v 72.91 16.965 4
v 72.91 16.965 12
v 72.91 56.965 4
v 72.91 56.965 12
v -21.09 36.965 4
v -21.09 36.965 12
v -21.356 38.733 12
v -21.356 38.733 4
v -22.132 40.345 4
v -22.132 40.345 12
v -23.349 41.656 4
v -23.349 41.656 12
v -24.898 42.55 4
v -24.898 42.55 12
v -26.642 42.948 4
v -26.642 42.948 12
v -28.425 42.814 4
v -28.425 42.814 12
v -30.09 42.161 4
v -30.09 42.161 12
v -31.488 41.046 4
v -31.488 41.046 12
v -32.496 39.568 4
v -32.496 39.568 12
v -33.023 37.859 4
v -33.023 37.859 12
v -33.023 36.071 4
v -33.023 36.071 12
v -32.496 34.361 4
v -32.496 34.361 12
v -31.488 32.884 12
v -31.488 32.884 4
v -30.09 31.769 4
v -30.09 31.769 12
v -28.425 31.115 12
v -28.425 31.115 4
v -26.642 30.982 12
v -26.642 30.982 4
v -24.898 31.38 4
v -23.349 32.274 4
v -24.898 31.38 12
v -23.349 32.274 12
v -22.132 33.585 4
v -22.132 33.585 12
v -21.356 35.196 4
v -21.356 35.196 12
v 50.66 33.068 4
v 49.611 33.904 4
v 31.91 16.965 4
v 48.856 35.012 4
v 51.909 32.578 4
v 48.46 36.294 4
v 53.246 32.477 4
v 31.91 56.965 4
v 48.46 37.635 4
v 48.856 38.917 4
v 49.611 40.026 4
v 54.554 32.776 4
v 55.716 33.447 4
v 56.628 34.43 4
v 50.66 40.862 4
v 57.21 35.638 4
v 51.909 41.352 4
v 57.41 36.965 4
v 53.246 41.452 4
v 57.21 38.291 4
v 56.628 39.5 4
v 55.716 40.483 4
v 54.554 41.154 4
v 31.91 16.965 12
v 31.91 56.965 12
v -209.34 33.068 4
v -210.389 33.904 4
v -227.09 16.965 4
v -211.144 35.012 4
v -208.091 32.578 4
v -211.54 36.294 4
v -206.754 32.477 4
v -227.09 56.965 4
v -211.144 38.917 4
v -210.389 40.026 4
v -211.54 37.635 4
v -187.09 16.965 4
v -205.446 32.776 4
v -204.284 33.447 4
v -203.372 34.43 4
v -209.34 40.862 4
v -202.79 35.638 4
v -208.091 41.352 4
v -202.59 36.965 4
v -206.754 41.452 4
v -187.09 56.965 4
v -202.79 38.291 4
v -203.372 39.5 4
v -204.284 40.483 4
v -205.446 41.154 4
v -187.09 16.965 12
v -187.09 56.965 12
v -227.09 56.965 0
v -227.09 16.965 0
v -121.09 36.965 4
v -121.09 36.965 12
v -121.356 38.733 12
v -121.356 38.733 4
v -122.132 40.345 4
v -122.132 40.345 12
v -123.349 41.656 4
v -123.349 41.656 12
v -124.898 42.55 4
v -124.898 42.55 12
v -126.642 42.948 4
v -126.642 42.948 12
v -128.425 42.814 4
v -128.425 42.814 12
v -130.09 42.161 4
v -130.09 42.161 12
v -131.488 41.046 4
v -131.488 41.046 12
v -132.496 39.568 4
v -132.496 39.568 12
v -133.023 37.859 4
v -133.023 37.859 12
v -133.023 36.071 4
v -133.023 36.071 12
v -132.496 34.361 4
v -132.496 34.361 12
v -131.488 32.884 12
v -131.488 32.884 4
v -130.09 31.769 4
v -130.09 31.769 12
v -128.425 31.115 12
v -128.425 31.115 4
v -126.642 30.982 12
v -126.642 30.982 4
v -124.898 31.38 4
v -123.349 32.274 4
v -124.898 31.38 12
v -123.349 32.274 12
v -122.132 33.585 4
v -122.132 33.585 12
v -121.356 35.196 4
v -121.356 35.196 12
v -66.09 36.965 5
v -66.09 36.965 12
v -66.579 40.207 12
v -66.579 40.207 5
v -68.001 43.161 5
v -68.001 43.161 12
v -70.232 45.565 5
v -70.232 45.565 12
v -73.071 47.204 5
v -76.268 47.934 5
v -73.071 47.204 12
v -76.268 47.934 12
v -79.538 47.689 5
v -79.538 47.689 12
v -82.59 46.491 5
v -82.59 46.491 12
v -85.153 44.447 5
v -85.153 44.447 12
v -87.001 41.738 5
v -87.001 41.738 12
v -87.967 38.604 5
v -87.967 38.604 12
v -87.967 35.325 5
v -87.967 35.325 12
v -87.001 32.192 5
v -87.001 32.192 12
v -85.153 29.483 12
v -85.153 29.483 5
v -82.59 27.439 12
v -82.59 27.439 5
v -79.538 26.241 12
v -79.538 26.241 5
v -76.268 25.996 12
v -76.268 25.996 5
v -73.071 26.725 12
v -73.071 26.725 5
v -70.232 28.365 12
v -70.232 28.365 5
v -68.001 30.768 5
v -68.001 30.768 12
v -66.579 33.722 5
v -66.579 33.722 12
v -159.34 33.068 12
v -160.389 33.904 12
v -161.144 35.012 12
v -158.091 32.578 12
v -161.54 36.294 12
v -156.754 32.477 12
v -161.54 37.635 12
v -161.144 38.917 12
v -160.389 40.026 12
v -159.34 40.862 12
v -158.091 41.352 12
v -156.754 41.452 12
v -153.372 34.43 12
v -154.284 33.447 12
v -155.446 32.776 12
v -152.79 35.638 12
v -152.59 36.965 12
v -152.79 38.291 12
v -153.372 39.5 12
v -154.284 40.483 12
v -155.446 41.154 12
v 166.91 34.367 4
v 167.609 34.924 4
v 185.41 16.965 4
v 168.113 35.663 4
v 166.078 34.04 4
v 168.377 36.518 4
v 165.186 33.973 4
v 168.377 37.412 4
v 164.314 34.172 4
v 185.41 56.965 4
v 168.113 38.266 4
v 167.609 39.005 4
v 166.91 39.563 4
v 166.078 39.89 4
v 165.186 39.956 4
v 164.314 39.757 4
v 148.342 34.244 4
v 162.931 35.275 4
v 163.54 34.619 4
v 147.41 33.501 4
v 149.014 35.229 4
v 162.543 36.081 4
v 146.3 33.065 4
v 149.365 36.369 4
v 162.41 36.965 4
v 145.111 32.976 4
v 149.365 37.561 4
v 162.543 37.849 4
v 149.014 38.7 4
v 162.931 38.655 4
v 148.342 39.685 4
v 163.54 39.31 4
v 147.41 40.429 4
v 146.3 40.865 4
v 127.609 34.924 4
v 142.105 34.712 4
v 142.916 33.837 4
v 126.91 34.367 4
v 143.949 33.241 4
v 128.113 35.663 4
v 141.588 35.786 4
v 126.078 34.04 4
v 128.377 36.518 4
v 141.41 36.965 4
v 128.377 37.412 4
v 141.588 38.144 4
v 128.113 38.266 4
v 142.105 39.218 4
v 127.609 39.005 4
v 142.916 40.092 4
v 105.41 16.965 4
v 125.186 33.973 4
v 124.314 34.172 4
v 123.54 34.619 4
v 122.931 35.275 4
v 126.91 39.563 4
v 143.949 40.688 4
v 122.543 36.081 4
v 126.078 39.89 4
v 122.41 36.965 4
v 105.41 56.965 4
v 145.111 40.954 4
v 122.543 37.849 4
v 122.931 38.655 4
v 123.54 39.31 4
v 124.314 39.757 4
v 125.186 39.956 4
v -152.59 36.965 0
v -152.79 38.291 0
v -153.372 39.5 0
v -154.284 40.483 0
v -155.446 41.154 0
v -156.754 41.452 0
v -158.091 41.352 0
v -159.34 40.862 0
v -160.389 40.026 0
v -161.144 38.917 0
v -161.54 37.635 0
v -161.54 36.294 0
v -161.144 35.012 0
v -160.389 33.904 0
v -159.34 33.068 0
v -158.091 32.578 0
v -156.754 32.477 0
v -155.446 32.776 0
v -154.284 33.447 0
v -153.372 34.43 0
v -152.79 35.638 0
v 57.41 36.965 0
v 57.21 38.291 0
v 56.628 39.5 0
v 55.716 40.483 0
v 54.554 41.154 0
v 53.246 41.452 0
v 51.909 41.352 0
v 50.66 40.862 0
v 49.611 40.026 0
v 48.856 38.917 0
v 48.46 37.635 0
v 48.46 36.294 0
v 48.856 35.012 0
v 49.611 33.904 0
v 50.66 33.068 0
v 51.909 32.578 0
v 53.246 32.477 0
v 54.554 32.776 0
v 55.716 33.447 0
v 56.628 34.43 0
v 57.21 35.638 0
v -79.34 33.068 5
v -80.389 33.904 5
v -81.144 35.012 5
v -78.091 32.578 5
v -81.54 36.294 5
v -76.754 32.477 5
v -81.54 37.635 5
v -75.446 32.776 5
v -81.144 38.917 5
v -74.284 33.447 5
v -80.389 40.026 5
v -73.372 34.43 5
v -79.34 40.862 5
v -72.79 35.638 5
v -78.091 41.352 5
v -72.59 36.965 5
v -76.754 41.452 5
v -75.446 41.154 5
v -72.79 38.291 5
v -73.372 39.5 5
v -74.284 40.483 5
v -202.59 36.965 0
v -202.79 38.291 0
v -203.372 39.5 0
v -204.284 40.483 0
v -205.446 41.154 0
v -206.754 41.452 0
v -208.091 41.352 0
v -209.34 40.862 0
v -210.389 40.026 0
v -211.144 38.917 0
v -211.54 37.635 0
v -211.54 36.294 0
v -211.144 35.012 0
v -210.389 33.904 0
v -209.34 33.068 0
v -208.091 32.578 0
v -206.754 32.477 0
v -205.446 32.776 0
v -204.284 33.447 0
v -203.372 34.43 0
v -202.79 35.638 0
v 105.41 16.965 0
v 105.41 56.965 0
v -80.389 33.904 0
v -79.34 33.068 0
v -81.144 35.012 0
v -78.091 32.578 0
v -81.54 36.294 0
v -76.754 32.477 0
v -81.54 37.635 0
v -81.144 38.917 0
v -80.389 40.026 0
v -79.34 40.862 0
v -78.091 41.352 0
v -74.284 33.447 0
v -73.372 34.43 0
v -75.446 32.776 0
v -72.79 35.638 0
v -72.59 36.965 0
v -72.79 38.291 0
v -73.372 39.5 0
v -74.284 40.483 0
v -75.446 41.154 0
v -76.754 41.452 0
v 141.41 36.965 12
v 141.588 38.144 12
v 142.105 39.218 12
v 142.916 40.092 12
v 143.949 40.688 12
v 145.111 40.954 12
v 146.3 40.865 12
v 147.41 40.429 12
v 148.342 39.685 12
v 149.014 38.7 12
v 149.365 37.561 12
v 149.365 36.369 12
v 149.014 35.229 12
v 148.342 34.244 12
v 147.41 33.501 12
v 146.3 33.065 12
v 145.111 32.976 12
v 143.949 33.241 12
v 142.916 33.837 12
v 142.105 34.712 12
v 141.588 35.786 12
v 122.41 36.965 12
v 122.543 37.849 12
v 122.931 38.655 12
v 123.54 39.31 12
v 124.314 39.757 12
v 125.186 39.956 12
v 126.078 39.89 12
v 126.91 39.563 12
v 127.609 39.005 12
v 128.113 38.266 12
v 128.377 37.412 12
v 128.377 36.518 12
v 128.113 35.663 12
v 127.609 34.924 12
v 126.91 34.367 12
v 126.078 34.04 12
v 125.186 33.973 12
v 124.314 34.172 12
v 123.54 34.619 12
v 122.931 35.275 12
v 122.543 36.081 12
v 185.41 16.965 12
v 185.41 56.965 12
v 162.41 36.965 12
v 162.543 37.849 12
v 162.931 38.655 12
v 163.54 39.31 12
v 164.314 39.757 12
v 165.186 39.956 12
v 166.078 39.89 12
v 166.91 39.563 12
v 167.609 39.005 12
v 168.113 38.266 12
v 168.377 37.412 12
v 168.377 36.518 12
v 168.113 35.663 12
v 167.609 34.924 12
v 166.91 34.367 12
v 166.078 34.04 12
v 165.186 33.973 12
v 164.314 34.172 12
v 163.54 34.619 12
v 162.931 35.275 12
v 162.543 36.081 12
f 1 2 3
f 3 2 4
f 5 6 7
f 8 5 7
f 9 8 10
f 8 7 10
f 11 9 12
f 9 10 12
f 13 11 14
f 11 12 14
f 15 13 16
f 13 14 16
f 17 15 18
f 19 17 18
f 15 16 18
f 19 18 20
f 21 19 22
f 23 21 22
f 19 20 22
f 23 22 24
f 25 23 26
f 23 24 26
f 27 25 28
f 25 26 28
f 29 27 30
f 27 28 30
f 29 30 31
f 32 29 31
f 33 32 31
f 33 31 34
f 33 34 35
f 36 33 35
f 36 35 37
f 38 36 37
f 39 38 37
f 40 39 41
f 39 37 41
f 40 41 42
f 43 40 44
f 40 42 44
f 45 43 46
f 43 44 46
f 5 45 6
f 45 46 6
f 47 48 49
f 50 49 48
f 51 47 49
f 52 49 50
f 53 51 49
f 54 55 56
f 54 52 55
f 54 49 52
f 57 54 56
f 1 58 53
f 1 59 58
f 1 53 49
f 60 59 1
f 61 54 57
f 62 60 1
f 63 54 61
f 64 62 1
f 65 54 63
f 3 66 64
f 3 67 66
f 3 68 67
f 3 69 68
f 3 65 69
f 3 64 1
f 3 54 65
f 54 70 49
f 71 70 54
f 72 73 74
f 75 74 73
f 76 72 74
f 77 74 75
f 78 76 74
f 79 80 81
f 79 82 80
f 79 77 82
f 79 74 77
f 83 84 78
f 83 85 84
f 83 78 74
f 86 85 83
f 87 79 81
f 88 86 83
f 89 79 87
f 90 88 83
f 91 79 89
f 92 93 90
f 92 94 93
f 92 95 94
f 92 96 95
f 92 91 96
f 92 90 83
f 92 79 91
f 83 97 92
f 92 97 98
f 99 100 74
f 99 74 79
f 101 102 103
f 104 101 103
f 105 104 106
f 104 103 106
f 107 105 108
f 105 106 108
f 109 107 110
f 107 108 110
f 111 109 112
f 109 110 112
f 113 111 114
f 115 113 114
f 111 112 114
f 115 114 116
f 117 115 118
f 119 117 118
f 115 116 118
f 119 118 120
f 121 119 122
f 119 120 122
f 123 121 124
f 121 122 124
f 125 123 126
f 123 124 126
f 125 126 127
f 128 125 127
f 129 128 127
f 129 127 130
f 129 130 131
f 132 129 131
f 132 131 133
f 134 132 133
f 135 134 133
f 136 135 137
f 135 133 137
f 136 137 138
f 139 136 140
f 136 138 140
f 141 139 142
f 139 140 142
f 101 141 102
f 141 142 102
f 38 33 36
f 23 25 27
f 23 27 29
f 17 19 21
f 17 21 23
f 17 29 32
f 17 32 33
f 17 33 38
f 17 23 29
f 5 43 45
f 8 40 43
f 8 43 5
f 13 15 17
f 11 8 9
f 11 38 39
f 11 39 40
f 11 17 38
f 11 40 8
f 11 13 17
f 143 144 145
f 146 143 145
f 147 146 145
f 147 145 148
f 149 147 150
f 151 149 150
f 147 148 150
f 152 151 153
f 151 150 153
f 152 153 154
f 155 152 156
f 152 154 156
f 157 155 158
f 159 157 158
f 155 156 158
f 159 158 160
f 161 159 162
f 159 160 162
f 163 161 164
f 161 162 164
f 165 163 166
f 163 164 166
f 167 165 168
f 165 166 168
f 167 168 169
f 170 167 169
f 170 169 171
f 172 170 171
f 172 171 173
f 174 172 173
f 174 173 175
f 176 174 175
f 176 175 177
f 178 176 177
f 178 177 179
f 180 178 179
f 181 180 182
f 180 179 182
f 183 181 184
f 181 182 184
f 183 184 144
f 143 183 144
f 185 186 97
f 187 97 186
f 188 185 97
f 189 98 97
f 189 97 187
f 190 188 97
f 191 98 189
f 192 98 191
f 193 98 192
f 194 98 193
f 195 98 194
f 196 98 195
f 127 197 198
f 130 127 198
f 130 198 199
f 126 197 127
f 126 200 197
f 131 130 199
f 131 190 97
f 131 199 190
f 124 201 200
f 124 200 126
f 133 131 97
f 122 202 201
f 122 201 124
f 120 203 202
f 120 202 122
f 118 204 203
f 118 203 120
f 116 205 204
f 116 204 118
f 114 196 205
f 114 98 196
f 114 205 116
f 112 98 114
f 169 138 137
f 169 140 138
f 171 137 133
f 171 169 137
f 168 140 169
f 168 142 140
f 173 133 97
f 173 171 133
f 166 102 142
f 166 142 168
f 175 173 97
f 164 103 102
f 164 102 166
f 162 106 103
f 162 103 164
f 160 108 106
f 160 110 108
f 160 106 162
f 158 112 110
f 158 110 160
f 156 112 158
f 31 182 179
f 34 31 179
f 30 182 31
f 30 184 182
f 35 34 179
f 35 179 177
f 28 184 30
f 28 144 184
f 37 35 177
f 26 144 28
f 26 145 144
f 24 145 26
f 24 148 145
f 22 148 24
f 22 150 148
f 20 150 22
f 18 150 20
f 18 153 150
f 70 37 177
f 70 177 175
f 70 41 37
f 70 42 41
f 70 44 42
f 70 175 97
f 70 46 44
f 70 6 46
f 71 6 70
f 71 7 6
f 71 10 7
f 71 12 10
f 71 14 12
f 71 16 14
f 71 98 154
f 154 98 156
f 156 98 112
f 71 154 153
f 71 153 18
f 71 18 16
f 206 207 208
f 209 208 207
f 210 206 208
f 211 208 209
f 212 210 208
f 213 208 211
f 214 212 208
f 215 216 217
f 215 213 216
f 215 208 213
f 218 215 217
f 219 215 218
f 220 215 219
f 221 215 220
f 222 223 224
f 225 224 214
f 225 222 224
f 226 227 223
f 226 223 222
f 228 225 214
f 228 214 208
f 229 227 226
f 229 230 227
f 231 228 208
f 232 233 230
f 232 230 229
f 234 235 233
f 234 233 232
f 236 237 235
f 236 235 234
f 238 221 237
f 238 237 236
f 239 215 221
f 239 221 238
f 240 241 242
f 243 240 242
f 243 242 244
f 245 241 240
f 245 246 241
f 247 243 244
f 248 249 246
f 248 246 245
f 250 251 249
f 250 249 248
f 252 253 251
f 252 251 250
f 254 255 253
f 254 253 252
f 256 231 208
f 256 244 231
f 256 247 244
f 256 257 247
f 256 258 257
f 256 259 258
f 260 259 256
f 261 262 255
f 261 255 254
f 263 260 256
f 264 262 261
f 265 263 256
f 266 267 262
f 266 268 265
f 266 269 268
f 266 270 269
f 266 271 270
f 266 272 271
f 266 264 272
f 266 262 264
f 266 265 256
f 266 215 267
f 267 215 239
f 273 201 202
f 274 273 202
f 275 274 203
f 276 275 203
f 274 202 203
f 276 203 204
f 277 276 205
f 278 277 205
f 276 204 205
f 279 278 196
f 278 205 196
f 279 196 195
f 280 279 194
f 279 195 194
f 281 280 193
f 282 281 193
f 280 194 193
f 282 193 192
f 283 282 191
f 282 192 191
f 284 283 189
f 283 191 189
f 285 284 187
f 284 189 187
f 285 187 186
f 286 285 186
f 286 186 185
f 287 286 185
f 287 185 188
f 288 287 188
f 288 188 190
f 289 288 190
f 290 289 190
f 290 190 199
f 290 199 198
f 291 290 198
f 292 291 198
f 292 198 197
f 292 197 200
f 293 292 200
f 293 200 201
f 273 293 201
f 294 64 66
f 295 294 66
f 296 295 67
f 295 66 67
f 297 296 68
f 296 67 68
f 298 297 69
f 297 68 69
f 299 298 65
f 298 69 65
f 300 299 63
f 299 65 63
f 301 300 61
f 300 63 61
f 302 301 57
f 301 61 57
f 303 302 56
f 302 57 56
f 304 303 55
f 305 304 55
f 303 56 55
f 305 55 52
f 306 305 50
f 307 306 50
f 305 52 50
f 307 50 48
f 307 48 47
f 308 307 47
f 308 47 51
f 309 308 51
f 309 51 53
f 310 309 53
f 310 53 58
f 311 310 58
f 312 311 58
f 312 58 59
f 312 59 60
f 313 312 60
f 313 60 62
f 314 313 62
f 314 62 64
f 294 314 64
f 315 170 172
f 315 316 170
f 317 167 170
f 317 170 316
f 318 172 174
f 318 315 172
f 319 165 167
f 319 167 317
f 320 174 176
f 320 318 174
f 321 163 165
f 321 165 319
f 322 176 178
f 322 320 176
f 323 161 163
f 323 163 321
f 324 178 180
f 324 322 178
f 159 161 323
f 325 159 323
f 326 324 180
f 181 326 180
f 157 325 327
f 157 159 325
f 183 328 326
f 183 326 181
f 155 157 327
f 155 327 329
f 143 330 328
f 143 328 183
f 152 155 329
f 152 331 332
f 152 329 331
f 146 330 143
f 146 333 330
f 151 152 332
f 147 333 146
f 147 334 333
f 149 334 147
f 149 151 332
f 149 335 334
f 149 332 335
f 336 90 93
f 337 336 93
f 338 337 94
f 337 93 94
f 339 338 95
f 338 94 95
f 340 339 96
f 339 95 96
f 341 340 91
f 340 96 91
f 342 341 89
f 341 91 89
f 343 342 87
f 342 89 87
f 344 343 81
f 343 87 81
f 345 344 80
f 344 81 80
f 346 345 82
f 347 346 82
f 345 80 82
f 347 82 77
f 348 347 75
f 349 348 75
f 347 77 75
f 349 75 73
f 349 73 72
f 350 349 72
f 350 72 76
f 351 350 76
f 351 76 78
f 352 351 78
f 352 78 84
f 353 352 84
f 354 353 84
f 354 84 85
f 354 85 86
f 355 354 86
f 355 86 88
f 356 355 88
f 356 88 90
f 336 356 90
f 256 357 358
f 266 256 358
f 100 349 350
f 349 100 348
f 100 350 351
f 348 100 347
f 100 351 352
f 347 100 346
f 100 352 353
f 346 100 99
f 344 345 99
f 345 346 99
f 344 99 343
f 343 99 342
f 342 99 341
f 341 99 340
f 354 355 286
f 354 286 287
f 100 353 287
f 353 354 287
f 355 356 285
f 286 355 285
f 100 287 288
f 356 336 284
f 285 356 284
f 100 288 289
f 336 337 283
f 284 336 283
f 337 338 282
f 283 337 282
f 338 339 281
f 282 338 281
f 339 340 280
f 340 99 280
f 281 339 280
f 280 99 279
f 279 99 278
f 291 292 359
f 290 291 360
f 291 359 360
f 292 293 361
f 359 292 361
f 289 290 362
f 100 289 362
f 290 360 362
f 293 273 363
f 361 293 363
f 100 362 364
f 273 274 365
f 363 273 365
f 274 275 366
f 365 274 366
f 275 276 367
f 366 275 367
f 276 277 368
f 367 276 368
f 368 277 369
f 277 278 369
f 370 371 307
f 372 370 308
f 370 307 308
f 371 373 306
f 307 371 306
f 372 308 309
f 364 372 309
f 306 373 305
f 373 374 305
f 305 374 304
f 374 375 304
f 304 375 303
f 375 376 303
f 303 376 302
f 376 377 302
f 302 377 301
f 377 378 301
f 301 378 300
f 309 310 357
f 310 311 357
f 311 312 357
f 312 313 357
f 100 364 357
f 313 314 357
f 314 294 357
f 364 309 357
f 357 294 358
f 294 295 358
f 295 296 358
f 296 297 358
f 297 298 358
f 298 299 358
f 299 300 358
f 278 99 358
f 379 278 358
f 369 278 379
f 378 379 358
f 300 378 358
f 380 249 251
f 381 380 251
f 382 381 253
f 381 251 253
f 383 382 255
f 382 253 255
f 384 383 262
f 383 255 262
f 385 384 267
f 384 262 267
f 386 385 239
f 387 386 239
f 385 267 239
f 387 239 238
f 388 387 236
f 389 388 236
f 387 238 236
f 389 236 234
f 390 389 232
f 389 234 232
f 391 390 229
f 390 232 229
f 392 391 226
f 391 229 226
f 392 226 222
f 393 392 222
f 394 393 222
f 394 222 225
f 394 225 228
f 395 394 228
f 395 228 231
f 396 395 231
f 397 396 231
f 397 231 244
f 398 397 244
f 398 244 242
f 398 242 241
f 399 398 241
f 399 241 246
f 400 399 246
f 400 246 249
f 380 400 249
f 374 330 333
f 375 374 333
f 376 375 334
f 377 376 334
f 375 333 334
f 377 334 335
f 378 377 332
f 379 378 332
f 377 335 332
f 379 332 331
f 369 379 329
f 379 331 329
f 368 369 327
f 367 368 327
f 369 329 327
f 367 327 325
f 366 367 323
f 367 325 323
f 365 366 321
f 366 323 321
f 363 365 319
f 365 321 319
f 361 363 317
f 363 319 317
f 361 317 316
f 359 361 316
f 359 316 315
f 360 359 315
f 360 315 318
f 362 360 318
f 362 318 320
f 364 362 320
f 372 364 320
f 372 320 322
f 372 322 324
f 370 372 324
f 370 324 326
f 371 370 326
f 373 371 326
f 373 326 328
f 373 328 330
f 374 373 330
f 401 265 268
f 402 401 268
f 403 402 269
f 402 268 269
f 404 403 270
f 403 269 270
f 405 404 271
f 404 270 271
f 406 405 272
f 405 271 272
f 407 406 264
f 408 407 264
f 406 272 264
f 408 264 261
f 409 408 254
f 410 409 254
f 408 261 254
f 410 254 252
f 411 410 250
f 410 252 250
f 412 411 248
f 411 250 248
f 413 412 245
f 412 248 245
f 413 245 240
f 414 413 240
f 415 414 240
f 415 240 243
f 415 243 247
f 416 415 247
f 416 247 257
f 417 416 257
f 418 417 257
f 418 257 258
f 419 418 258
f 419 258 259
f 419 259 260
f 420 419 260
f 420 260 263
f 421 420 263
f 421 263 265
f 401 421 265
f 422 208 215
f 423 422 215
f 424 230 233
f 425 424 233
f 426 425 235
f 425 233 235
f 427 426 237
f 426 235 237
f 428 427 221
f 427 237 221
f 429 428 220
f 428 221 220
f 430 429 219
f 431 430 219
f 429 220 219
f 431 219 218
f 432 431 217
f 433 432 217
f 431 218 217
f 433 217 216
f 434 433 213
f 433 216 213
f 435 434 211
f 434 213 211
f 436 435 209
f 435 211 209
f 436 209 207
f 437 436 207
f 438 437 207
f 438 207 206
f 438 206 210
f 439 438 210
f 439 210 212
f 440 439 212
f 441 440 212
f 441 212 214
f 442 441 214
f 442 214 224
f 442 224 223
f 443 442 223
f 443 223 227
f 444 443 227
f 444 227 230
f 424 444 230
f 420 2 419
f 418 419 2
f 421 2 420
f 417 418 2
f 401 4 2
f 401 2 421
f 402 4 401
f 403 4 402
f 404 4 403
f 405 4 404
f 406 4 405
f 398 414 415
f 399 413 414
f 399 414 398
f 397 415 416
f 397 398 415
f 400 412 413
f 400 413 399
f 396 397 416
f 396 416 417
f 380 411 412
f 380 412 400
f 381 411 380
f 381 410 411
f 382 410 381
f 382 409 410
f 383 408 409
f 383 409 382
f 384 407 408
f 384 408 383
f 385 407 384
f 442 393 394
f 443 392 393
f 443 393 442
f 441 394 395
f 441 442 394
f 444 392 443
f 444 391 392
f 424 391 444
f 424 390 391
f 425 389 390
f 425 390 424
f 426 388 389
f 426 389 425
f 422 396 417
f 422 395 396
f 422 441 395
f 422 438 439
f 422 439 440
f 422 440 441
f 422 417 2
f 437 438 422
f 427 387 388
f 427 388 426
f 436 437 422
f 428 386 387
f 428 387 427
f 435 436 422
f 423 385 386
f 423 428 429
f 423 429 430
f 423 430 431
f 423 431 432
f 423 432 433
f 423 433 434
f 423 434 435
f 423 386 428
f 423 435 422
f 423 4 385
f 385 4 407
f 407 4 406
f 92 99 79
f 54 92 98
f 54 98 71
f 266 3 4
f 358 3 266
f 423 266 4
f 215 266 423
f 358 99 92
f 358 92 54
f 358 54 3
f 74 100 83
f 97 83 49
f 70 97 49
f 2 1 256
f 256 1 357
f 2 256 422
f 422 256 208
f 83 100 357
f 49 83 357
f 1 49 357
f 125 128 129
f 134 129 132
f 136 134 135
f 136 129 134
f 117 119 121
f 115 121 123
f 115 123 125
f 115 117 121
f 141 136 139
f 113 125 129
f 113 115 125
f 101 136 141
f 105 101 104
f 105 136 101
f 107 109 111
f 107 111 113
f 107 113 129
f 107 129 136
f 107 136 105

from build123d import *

# Parameters (mm, degrees)
ESQUISSE1_W             = 412.5
ESQUISSE1_H             = 40
BOSS_EXTRU_1_DEPTH      = 12
ESQUISSE2_R             = 4.5
ENL_V_MAT_EXTRU_1_DEPTH = 13
ESQUISSE3_R             = 11
ENL_V_MAT_EXTRU_2_DEPTH = 7
ESQUISSE4_W             = 40
ESQUISSE4_H             = 40
ESQUISSE4_W_2           = 41
ENL_V_MAT_EXTRU_3_DEPTH = 8
ESQUISSE5_R             = 6
ENL_V_MAT_EXTRU_5_DEPTH = 8
ESQUISSE6_W             = 80
ESQUISSE6_H             = 40
ENL_V_MAT_EXTRU_6_DEPTH = 4
ESQUISSE7_R             = 3
ENL_V_MAT_EXTRU_7_DEPTH = 9
ESQUISSE8_R             = 4
ENL_V_MAT_EXTRU_8_DEPTH = 9
ESQUISSE9_R             = 4.5
ENL_V_MAT_EXTRU_9_DEPTH = 6


with BuildPart() as part:
    # Esquisse1 → Boss.-Extru.1 (new body)
    with BuildSketch(Plane.XY):
        with Locations((-20.839929175, 36.964793741)):
            Rectangle(ESQUISSE1_W, ESQUISSE1_H)
    extrude(amount=BOSS_EXTRU_1_DEPTH)

    # Esquisse2 → Enlèv. mat.-Extru.1 (cut, through all)
    with BuildSketch(Plane.XY.offset(12)):
        with Locations((-207.089929175, 36.964793741)):
            Circle(ESQUISSE2_R)
        with Locations((-157.089929175, 36.964793741)):
            Circle(ESQUISSE2_R)
        with Locations((52.910070825, 36.964793741)):
            Circle(ESQUISSE2_R)
    extrude(amount=-ENL_V_MAT_EXTRU_1_DEPTH, mode=Mode.SUBTRACT)

    # Esquisse3 → Enlèv. mat.-Extru.2 (cut)
    with BuildSketch(Plane.XY.offset(12)):
        with Locations((-77.089929175, 36.964793741)):
            Circle(ESQUISSE3_R)
    extrude(amount=-ENL_V_MAT_EXTRU_2_DEPTH, mode=Mode.SUBTRACT)

    # Esquisse4 → Enlèv. mat.-Extru.3 (cut)
    with BuildSketch(Plane.XY.offset(12)):
        with Locations((-207.089929175, 36.964793741)):
            Rectangle(ESQUISSE4_W, ESQUISSE4_H)
        with Locations((52.410070825, 36.964793741)):
            Rectangle(ESQUISSE4_W_2, ESQUISSE4_H)
    extrude(amount=-ENL_V_MAT_EXTRU_3_DEPTH, mode=Mode.SUBTRACT)

    # Esquisse5 → Enlèv. mat.-Extru.5 (cut)
    with BuildSketch(Plane.XY.offset(12)):
        with Locations((-127.089929175, 36.964793741)):
            Circle(ESQUISSE5_R)
        with Locations((-27.089929175, 36.964793741)):
            Circle(ESQUISSE5_R)
    extrude(amount=-ENL_V_MAT_EXTRU_5_DEPTH, mode=Mode.SUBTRACT)

    # Esquisse6 → Enlèv. mat.-Extru.6 (cut)
    with BuildSketch(Plane(origin=(0, 0, 0), x_dir=(-1, 0, 0), z_dir=(0, 0, -1))):
        with Locations((-145.410070825, 36.964793741)):
            Rectangle(ESQUISSE6_W, ESQUISSE6_H)
    extrude(amount=-ENL_V_MAT_EXTRU_6_DEPTH, mode=Mode.SUBTRACT)

    # Esquisse7 → Enlèv. mat.-Extru.7 (cut, through all)
    with BuildSketch(Plane(origin=(0, 0, 4), x_dir=(-1, 0, 0), z_dir=(0, 0, -1))):
        with Locations((-165.410070825, 36.964793741)):
            Circle(ESQUISSE7_R)
        with Locations((-125.410070825, 36.964793741)):
            Circle(ESQUISSE7_R)
    extrude(amount=-ENL_V_MAT_EXTRU_7_DEPTH, mode=Mode.SUBTRACT)

    # Esquisse8 → Enlèv. mat.-Extru.8 (cut, through all)
    with BuildSketch(Plane(origin=(0, 0, 4), x_dir=(-1, 0, 0), z_dir=(0, 0, -1))):
        with Locations((-145.410070825, 36.964793741)):
            Circle(ESQUISSE8_R)
    extrude(amount=-ENL_V_MAT_EXTRU_8_DEPTH, mode=Mode.SUBTRACT)

    # Esquisse9 → Enlèv. mat.-Extru.9 (cut, through all)
    with BuildSketch(Plane.XY.offset(5)):
        with Locations((-77.089929175, 36.964793741)):
            Circle(ESQUISSE9_R)
    extrude(amount=-ENL_V_MAT_EXTRU_9_DEPTH, mode=Mode.SUBTRACT)


solid = part.part
